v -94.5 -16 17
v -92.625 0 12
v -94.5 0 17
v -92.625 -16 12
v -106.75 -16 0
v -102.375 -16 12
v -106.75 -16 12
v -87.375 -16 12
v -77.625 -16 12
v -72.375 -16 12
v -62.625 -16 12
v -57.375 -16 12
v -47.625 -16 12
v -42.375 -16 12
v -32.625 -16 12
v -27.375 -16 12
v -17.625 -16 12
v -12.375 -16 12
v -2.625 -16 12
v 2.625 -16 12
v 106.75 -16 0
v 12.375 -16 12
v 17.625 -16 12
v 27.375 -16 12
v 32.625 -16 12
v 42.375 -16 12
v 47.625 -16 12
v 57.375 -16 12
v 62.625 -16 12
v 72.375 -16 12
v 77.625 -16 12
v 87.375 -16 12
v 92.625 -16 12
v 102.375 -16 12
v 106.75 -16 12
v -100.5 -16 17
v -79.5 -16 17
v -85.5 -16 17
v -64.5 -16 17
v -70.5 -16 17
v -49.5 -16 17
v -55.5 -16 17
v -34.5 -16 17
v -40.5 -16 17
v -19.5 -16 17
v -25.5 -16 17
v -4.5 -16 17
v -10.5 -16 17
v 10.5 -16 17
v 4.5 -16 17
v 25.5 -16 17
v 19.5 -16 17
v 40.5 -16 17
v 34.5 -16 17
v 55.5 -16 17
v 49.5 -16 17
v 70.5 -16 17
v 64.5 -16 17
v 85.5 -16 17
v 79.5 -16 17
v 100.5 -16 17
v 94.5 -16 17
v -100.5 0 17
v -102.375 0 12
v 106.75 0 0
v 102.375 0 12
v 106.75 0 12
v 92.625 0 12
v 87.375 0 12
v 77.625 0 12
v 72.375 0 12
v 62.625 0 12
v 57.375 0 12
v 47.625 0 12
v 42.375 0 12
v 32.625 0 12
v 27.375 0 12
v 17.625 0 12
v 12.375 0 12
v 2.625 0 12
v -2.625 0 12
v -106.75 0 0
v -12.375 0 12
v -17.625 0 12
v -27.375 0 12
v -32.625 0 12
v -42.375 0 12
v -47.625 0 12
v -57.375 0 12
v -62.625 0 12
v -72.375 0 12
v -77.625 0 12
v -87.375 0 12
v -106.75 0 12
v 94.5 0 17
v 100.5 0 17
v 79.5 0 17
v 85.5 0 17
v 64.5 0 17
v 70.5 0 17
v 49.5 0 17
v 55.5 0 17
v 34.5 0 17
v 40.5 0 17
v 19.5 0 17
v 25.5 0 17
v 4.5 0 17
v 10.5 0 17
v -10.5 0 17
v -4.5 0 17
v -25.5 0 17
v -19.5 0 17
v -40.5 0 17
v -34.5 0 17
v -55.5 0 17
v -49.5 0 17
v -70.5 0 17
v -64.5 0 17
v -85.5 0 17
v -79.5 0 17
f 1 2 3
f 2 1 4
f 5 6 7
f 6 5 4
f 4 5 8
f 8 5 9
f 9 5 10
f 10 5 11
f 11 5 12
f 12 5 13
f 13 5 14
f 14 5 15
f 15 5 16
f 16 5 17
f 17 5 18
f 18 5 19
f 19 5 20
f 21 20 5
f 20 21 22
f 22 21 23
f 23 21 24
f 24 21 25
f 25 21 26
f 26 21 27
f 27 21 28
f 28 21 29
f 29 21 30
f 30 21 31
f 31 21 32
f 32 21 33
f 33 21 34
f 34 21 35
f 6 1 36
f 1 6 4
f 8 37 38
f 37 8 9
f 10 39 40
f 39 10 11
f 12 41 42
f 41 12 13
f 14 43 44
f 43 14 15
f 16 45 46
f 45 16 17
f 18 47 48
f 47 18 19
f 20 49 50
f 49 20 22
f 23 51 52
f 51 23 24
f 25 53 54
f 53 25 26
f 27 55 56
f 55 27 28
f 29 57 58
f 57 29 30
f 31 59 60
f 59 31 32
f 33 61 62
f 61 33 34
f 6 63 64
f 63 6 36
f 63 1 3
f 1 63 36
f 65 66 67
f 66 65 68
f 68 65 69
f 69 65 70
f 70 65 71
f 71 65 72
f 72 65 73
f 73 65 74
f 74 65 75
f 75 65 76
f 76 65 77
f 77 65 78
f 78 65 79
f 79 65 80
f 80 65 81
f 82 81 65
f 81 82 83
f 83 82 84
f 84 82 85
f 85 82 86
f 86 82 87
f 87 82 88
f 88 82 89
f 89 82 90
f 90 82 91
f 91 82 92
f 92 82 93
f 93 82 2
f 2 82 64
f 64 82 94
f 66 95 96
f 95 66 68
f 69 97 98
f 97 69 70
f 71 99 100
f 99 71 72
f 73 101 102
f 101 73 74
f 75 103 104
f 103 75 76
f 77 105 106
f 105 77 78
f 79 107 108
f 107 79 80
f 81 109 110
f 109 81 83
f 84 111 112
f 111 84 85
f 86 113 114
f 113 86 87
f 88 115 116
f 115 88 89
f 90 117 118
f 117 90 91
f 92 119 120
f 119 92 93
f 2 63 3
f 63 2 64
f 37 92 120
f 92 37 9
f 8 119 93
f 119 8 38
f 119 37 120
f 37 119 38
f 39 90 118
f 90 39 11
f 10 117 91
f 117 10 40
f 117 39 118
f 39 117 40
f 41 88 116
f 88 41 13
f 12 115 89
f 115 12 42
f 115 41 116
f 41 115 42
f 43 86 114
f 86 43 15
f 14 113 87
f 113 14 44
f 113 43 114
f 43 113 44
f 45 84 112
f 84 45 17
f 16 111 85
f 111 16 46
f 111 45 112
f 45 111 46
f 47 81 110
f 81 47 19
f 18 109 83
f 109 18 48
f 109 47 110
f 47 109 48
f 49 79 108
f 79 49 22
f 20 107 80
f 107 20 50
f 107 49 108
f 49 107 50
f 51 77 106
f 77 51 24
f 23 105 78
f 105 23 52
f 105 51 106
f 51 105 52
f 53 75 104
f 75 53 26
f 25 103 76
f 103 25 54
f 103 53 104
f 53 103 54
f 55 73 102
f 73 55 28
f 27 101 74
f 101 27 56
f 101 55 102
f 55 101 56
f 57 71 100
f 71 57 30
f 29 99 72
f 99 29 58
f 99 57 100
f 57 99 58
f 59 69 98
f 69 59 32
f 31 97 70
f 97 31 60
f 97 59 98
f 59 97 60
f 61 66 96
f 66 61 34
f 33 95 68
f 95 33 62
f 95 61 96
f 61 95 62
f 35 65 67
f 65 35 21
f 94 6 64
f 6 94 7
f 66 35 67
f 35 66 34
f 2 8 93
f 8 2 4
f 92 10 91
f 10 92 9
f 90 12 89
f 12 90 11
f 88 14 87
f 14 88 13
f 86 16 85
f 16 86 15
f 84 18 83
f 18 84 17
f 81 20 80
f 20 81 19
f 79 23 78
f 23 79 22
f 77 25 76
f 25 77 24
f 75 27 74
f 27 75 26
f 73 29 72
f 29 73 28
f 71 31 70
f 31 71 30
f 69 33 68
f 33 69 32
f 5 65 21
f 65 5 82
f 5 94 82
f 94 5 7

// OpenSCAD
$fn = 32;

// ----------------------------------------------------------------------
// Toothed rack, 14 teeth
// 15 mm pitch, 5 mm teeth
// ----------------------------------------------------------------------

// --- parameters (mm) ---
bar_w = 16;     // bar width (Y)
bar_h = 12;     // bar height (Z)
teeth = 14;     // number of teeth
pitch = 15;     // tooth pitch
tooth_h = 5;    // tooth height above the bar
root_w = 10.5;  // tooth width at the root
crest_w = 6;    // tooth width at the crest

// --- derived feature positions (mm) ---
span = (teeth - 1) * pitch;  // = 195   distance between the outer teeth
bar_l = span + root_w + 8;   // = 213.5   bar length: teeth plus 4 mm at each end
tooth_x = -span / 2;         // = -97.5   X of the first tooth
height = bar_h + tooth_h;    // = 17   overall height
feature_centers = [
  [tooth_x + 0 * pitch, -bar_w / 2],
  [tooth_x + 1 * pitch, -bar_w / 2],
  [tooth_x + 2 * pitch, -bar_w / 2],
  [tooth_x + 3 * pitch, -bar_w / 2],
  [tooth_x + 4 * pitch, -bar_w / 2],
  [tooth_x + 5 * pitch, -bar_w / 2],
  [tooth_x + 6 * pitch, -bar_w / 2],
  [tooth_x + 7 * pitch, -bar_w / 2],
  [tooth_x + 8 * pitch, -bar_w / 2],
  [tooth_x + 9 * pitch, -bar_w / 2],
  [tooth_x + 10 * pitch, -bar_w / 2],
  [tooth_x + 11 * pitch, -bar_w / 2],
  [tooth_x + 12 * pitch, -bar_w / 2],
  [tooth_x + 13 * pitch, -bar_w / 2]
];   // tooth centre line, drives the tooth loop

// bar with a rack of teeth, one extruded trapezoium per centre
module rack_tooth() {
  linear_extrude(height = bar_w)
    polygon(points = [
      [0, 0],
      [root_w, 0],
      [root_w / 2 + crest_w / 2, tooth_h + 1],
      [root_w / 2 - crest_w / 2, tooth_h + 1]
    ]);
}

union() {
  translate([-bar_l / 2, -bar_w, 0]) cube([bar_l, bar_w, bar_h]);
  for (centre = feature_centers)
    translate([centre[0] - root_w / 2, 0, bar_h - 1]) rotate([90, 0, 0]) rack_tooth();
}
